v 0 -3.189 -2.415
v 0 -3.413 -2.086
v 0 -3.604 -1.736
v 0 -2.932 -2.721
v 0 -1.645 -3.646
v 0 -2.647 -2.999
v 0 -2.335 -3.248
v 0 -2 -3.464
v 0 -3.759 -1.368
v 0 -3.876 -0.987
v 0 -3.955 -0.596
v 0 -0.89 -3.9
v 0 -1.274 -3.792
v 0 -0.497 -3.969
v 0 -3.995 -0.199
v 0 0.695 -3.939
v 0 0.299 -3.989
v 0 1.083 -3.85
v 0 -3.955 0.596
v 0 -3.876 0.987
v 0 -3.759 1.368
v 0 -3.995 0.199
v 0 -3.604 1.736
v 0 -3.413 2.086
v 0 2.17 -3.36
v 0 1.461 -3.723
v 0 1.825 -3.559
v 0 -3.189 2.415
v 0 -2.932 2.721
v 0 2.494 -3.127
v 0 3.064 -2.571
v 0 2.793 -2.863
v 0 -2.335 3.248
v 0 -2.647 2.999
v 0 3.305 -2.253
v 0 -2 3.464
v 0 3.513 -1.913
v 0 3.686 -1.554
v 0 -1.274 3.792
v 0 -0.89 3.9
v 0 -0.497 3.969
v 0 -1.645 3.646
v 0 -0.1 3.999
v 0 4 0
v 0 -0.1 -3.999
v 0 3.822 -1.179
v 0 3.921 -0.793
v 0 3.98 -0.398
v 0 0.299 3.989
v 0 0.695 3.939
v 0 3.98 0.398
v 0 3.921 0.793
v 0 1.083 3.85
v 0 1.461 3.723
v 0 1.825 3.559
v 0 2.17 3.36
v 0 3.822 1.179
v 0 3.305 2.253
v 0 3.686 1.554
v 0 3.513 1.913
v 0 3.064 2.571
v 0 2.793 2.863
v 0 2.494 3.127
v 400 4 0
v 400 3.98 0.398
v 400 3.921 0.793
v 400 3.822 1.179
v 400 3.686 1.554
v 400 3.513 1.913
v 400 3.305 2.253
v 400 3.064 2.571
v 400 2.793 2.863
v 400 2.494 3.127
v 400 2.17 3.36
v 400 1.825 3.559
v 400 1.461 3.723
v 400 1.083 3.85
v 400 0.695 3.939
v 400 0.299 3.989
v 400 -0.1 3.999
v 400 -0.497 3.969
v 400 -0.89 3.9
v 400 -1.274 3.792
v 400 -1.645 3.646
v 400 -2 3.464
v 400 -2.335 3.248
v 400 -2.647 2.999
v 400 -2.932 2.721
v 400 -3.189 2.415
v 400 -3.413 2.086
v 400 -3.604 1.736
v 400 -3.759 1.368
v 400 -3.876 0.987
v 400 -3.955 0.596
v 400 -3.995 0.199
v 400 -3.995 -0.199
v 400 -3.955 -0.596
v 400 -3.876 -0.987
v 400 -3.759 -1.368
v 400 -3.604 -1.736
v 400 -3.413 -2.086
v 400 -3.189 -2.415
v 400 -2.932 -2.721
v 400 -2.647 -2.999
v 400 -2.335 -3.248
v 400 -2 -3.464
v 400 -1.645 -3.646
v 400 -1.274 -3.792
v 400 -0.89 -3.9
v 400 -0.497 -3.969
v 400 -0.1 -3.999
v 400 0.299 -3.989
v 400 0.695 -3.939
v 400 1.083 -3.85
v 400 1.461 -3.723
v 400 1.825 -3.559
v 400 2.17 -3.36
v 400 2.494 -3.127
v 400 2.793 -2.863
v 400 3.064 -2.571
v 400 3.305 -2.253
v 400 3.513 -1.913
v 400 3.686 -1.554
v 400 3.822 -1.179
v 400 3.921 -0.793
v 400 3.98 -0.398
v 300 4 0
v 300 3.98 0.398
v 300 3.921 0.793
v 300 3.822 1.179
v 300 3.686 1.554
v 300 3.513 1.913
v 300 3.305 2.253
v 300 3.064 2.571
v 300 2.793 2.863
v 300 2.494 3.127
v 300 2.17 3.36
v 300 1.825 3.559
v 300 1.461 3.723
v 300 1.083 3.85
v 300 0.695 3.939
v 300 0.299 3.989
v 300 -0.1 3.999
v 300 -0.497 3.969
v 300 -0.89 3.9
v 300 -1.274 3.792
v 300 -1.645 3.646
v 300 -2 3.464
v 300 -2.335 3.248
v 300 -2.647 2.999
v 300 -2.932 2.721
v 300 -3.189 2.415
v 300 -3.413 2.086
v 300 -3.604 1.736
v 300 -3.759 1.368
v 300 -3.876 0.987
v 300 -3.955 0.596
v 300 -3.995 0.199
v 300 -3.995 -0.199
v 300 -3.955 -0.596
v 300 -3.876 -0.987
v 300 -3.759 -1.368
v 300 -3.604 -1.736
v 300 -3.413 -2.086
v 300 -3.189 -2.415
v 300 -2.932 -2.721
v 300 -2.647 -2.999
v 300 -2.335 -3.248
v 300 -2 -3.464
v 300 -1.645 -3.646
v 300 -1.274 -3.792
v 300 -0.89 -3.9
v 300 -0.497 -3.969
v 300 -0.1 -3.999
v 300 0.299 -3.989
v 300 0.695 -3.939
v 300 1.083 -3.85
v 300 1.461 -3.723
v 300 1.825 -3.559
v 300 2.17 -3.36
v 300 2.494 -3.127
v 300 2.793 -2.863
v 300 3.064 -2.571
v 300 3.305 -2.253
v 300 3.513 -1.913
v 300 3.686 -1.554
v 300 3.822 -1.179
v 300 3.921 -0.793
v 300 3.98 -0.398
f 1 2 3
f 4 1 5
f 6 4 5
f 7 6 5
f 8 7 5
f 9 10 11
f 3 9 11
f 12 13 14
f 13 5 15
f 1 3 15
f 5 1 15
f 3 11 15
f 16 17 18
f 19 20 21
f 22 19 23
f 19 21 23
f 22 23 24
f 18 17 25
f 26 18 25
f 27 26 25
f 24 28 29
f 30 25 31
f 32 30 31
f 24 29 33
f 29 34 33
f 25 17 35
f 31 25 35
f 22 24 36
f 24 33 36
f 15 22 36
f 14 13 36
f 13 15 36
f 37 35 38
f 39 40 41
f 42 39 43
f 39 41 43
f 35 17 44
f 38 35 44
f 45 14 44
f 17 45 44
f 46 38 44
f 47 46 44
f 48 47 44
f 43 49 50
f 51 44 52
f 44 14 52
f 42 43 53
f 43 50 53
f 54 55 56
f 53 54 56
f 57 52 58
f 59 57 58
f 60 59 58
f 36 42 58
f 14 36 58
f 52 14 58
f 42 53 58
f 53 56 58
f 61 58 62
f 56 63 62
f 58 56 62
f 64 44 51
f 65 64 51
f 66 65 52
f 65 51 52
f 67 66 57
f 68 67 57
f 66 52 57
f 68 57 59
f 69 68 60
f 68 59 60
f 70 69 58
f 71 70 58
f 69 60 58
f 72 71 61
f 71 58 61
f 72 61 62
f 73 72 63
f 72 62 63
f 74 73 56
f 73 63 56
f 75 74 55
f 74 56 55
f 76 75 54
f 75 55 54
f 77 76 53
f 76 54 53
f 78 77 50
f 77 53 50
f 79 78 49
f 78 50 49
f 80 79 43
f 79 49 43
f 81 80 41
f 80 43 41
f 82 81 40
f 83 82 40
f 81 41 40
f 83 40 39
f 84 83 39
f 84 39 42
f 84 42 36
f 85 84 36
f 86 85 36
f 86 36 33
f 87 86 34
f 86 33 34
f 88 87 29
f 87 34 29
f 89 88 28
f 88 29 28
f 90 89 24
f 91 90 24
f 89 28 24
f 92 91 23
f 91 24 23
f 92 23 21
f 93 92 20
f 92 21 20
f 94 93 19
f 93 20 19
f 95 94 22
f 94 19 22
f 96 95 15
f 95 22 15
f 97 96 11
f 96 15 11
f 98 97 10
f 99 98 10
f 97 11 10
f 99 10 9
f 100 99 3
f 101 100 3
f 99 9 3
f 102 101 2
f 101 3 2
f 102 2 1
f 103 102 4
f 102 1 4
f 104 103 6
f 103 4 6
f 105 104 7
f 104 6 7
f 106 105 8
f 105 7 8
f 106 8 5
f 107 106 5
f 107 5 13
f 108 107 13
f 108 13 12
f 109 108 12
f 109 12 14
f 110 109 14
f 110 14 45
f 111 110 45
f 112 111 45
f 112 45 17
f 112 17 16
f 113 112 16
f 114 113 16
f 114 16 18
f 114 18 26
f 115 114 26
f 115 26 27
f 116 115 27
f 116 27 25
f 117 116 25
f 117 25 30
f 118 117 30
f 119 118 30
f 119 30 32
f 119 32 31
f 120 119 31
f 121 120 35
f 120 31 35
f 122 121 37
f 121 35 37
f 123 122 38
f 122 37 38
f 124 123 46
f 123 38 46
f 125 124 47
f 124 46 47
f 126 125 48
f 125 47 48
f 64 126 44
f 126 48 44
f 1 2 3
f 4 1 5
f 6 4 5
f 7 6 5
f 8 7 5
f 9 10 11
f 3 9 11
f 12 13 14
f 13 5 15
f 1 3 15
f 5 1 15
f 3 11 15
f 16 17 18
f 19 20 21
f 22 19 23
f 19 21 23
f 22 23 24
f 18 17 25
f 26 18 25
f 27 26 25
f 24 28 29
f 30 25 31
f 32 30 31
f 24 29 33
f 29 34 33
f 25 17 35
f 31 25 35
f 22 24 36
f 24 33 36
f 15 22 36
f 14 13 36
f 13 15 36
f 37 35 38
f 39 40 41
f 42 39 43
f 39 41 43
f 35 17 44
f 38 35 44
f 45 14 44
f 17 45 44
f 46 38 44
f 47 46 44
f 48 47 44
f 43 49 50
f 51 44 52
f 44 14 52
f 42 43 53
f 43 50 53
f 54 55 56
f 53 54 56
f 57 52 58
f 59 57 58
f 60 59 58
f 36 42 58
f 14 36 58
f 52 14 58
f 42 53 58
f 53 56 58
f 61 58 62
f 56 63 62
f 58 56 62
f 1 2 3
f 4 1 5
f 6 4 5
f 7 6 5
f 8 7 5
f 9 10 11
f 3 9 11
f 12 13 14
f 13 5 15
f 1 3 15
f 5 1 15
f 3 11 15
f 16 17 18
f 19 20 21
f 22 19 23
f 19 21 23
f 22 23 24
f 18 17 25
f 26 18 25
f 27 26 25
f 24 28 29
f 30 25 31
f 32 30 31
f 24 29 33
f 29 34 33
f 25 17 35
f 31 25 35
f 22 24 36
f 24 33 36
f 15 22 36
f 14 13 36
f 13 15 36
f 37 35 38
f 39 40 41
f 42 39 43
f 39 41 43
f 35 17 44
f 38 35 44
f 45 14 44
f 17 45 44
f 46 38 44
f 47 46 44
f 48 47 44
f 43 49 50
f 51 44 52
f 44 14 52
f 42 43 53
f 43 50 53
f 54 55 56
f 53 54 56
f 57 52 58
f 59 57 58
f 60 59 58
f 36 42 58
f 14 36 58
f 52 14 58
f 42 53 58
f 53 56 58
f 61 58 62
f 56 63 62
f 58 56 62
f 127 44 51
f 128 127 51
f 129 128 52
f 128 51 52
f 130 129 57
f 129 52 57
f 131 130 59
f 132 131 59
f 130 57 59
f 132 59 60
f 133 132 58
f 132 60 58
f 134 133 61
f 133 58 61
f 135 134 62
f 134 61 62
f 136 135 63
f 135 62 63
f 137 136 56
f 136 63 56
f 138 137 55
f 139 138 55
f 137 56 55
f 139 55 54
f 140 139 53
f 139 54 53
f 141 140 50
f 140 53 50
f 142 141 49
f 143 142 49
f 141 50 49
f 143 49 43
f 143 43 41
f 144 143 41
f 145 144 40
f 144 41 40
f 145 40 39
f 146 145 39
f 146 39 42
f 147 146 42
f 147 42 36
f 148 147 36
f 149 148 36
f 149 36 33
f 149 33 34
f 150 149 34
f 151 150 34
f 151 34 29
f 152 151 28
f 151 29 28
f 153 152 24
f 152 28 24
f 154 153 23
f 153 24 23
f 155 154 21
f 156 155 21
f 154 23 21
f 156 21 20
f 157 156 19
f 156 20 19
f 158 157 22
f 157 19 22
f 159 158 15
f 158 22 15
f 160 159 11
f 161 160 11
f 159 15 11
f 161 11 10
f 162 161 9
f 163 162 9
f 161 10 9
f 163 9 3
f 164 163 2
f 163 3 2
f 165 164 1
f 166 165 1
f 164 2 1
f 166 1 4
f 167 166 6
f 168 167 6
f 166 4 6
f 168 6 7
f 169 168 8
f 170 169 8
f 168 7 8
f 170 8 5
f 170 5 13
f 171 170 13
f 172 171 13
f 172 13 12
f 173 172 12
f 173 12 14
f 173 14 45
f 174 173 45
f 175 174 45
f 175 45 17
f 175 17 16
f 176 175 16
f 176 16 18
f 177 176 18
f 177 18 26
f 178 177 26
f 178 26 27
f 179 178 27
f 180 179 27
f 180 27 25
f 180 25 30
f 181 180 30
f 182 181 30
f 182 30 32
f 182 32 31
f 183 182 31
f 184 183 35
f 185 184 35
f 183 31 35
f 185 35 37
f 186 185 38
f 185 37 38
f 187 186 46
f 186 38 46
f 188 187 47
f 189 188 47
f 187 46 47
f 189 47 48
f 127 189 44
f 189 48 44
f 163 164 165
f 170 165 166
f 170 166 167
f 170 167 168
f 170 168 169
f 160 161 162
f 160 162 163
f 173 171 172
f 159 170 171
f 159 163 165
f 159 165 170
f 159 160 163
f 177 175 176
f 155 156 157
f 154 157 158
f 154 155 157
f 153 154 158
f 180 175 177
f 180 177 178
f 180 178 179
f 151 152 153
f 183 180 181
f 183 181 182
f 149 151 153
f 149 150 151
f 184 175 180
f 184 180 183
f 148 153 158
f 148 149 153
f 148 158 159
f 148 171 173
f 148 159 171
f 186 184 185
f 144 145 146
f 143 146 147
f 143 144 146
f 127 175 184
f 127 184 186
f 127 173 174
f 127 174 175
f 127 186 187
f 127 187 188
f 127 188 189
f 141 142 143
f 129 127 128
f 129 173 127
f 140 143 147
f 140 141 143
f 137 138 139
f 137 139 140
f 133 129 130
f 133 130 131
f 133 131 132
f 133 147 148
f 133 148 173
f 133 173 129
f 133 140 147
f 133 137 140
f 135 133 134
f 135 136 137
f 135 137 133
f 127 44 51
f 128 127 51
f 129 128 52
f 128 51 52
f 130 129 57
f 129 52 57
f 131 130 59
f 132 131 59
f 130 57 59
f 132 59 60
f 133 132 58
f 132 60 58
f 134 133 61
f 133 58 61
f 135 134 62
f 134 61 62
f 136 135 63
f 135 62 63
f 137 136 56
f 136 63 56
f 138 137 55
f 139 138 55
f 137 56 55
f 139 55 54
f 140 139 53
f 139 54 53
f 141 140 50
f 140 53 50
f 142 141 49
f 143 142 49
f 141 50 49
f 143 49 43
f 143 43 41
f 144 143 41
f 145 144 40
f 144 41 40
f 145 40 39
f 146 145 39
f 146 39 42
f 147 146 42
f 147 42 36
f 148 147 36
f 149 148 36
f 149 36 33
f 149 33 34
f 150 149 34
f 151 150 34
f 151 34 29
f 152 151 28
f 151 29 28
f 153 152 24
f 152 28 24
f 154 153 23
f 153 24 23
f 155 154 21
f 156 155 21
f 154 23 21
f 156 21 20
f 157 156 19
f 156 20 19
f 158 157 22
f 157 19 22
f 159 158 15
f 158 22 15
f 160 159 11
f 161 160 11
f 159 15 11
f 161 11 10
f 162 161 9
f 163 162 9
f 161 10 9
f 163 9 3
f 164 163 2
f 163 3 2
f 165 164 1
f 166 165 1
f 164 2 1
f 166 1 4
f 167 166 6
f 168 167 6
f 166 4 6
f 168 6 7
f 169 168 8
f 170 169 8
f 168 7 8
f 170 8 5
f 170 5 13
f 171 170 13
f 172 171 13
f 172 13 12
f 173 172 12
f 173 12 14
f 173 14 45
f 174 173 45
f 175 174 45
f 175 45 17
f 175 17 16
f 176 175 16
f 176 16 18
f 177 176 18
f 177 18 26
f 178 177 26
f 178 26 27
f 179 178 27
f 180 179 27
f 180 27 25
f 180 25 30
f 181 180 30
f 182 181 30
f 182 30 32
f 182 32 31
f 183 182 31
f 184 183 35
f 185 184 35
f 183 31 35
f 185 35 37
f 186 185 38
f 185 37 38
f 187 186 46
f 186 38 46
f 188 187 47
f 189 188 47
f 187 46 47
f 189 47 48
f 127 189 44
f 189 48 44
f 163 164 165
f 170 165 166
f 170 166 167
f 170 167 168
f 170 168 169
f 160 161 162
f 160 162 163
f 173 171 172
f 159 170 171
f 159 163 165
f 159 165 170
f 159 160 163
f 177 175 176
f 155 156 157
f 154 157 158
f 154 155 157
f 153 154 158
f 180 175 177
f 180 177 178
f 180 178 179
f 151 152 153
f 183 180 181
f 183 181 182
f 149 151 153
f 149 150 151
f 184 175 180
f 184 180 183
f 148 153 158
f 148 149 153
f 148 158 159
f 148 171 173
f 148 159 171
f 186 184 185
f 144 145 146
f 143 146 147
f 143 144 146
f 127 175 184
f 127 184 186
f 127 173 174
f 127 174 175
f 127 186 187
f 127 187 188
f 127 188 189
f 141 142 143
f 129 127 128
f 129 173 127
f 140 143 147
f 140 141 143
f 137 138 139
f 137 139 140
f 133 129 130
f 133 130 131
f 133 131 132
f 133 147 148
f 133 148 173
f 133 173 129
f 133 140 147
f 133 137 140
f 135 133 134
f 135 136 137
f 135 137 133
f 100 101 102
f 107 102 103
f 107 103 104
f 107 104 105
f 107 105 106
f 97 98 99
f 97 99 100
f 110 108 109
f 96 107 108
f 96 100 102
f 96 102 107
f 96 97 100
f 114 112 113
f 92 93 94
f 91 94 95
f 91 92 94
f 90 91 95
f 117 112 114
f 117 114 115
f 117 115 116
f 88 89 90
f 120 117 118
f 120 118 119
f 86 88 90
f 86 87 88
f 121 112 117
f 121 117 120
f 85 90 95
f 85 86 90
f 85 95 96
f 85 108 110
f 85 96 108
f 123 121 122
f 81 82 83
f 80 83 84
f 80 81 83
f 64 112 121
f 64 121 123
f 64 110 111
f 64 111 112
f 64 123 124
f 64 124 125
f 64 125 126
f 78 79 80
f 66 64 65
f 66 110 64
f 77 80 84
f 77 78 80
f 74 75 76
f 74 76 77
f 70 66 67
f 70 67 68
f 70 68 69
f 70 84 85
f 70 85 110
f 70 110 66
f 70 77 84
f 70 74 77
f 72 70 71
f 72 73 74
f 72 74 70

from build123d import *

# Parameters (mm, degrees)
F0_R     = 4
F1_DEPTH = 300
F2_DEPTH = 400
F3_DEPTH = 300


with BuildPart() as f1:
    # F0 (on Right) → F1 (new body)
    with BuildSketch(Plane.YZ):
        Circle(F0_R)
    extrude(amount=F1_DEPTH)


with BuildPart() as f2:
    # F0 (on Right) → F2 (new body)
    with BuildSketch(Plane.YZ):
        Circle(F0_R)
    extrude(amount=F2_DEPTH)


with BuildPart() as f3:
    # F0 (on Right) → F3 (new body)
    with BuildSketch(Plane.YZ):
        Circle(F0_R)
    extrude(amount=F3_DEPTH)


solid = Compound([f1.part, f2.part, f3.part])
